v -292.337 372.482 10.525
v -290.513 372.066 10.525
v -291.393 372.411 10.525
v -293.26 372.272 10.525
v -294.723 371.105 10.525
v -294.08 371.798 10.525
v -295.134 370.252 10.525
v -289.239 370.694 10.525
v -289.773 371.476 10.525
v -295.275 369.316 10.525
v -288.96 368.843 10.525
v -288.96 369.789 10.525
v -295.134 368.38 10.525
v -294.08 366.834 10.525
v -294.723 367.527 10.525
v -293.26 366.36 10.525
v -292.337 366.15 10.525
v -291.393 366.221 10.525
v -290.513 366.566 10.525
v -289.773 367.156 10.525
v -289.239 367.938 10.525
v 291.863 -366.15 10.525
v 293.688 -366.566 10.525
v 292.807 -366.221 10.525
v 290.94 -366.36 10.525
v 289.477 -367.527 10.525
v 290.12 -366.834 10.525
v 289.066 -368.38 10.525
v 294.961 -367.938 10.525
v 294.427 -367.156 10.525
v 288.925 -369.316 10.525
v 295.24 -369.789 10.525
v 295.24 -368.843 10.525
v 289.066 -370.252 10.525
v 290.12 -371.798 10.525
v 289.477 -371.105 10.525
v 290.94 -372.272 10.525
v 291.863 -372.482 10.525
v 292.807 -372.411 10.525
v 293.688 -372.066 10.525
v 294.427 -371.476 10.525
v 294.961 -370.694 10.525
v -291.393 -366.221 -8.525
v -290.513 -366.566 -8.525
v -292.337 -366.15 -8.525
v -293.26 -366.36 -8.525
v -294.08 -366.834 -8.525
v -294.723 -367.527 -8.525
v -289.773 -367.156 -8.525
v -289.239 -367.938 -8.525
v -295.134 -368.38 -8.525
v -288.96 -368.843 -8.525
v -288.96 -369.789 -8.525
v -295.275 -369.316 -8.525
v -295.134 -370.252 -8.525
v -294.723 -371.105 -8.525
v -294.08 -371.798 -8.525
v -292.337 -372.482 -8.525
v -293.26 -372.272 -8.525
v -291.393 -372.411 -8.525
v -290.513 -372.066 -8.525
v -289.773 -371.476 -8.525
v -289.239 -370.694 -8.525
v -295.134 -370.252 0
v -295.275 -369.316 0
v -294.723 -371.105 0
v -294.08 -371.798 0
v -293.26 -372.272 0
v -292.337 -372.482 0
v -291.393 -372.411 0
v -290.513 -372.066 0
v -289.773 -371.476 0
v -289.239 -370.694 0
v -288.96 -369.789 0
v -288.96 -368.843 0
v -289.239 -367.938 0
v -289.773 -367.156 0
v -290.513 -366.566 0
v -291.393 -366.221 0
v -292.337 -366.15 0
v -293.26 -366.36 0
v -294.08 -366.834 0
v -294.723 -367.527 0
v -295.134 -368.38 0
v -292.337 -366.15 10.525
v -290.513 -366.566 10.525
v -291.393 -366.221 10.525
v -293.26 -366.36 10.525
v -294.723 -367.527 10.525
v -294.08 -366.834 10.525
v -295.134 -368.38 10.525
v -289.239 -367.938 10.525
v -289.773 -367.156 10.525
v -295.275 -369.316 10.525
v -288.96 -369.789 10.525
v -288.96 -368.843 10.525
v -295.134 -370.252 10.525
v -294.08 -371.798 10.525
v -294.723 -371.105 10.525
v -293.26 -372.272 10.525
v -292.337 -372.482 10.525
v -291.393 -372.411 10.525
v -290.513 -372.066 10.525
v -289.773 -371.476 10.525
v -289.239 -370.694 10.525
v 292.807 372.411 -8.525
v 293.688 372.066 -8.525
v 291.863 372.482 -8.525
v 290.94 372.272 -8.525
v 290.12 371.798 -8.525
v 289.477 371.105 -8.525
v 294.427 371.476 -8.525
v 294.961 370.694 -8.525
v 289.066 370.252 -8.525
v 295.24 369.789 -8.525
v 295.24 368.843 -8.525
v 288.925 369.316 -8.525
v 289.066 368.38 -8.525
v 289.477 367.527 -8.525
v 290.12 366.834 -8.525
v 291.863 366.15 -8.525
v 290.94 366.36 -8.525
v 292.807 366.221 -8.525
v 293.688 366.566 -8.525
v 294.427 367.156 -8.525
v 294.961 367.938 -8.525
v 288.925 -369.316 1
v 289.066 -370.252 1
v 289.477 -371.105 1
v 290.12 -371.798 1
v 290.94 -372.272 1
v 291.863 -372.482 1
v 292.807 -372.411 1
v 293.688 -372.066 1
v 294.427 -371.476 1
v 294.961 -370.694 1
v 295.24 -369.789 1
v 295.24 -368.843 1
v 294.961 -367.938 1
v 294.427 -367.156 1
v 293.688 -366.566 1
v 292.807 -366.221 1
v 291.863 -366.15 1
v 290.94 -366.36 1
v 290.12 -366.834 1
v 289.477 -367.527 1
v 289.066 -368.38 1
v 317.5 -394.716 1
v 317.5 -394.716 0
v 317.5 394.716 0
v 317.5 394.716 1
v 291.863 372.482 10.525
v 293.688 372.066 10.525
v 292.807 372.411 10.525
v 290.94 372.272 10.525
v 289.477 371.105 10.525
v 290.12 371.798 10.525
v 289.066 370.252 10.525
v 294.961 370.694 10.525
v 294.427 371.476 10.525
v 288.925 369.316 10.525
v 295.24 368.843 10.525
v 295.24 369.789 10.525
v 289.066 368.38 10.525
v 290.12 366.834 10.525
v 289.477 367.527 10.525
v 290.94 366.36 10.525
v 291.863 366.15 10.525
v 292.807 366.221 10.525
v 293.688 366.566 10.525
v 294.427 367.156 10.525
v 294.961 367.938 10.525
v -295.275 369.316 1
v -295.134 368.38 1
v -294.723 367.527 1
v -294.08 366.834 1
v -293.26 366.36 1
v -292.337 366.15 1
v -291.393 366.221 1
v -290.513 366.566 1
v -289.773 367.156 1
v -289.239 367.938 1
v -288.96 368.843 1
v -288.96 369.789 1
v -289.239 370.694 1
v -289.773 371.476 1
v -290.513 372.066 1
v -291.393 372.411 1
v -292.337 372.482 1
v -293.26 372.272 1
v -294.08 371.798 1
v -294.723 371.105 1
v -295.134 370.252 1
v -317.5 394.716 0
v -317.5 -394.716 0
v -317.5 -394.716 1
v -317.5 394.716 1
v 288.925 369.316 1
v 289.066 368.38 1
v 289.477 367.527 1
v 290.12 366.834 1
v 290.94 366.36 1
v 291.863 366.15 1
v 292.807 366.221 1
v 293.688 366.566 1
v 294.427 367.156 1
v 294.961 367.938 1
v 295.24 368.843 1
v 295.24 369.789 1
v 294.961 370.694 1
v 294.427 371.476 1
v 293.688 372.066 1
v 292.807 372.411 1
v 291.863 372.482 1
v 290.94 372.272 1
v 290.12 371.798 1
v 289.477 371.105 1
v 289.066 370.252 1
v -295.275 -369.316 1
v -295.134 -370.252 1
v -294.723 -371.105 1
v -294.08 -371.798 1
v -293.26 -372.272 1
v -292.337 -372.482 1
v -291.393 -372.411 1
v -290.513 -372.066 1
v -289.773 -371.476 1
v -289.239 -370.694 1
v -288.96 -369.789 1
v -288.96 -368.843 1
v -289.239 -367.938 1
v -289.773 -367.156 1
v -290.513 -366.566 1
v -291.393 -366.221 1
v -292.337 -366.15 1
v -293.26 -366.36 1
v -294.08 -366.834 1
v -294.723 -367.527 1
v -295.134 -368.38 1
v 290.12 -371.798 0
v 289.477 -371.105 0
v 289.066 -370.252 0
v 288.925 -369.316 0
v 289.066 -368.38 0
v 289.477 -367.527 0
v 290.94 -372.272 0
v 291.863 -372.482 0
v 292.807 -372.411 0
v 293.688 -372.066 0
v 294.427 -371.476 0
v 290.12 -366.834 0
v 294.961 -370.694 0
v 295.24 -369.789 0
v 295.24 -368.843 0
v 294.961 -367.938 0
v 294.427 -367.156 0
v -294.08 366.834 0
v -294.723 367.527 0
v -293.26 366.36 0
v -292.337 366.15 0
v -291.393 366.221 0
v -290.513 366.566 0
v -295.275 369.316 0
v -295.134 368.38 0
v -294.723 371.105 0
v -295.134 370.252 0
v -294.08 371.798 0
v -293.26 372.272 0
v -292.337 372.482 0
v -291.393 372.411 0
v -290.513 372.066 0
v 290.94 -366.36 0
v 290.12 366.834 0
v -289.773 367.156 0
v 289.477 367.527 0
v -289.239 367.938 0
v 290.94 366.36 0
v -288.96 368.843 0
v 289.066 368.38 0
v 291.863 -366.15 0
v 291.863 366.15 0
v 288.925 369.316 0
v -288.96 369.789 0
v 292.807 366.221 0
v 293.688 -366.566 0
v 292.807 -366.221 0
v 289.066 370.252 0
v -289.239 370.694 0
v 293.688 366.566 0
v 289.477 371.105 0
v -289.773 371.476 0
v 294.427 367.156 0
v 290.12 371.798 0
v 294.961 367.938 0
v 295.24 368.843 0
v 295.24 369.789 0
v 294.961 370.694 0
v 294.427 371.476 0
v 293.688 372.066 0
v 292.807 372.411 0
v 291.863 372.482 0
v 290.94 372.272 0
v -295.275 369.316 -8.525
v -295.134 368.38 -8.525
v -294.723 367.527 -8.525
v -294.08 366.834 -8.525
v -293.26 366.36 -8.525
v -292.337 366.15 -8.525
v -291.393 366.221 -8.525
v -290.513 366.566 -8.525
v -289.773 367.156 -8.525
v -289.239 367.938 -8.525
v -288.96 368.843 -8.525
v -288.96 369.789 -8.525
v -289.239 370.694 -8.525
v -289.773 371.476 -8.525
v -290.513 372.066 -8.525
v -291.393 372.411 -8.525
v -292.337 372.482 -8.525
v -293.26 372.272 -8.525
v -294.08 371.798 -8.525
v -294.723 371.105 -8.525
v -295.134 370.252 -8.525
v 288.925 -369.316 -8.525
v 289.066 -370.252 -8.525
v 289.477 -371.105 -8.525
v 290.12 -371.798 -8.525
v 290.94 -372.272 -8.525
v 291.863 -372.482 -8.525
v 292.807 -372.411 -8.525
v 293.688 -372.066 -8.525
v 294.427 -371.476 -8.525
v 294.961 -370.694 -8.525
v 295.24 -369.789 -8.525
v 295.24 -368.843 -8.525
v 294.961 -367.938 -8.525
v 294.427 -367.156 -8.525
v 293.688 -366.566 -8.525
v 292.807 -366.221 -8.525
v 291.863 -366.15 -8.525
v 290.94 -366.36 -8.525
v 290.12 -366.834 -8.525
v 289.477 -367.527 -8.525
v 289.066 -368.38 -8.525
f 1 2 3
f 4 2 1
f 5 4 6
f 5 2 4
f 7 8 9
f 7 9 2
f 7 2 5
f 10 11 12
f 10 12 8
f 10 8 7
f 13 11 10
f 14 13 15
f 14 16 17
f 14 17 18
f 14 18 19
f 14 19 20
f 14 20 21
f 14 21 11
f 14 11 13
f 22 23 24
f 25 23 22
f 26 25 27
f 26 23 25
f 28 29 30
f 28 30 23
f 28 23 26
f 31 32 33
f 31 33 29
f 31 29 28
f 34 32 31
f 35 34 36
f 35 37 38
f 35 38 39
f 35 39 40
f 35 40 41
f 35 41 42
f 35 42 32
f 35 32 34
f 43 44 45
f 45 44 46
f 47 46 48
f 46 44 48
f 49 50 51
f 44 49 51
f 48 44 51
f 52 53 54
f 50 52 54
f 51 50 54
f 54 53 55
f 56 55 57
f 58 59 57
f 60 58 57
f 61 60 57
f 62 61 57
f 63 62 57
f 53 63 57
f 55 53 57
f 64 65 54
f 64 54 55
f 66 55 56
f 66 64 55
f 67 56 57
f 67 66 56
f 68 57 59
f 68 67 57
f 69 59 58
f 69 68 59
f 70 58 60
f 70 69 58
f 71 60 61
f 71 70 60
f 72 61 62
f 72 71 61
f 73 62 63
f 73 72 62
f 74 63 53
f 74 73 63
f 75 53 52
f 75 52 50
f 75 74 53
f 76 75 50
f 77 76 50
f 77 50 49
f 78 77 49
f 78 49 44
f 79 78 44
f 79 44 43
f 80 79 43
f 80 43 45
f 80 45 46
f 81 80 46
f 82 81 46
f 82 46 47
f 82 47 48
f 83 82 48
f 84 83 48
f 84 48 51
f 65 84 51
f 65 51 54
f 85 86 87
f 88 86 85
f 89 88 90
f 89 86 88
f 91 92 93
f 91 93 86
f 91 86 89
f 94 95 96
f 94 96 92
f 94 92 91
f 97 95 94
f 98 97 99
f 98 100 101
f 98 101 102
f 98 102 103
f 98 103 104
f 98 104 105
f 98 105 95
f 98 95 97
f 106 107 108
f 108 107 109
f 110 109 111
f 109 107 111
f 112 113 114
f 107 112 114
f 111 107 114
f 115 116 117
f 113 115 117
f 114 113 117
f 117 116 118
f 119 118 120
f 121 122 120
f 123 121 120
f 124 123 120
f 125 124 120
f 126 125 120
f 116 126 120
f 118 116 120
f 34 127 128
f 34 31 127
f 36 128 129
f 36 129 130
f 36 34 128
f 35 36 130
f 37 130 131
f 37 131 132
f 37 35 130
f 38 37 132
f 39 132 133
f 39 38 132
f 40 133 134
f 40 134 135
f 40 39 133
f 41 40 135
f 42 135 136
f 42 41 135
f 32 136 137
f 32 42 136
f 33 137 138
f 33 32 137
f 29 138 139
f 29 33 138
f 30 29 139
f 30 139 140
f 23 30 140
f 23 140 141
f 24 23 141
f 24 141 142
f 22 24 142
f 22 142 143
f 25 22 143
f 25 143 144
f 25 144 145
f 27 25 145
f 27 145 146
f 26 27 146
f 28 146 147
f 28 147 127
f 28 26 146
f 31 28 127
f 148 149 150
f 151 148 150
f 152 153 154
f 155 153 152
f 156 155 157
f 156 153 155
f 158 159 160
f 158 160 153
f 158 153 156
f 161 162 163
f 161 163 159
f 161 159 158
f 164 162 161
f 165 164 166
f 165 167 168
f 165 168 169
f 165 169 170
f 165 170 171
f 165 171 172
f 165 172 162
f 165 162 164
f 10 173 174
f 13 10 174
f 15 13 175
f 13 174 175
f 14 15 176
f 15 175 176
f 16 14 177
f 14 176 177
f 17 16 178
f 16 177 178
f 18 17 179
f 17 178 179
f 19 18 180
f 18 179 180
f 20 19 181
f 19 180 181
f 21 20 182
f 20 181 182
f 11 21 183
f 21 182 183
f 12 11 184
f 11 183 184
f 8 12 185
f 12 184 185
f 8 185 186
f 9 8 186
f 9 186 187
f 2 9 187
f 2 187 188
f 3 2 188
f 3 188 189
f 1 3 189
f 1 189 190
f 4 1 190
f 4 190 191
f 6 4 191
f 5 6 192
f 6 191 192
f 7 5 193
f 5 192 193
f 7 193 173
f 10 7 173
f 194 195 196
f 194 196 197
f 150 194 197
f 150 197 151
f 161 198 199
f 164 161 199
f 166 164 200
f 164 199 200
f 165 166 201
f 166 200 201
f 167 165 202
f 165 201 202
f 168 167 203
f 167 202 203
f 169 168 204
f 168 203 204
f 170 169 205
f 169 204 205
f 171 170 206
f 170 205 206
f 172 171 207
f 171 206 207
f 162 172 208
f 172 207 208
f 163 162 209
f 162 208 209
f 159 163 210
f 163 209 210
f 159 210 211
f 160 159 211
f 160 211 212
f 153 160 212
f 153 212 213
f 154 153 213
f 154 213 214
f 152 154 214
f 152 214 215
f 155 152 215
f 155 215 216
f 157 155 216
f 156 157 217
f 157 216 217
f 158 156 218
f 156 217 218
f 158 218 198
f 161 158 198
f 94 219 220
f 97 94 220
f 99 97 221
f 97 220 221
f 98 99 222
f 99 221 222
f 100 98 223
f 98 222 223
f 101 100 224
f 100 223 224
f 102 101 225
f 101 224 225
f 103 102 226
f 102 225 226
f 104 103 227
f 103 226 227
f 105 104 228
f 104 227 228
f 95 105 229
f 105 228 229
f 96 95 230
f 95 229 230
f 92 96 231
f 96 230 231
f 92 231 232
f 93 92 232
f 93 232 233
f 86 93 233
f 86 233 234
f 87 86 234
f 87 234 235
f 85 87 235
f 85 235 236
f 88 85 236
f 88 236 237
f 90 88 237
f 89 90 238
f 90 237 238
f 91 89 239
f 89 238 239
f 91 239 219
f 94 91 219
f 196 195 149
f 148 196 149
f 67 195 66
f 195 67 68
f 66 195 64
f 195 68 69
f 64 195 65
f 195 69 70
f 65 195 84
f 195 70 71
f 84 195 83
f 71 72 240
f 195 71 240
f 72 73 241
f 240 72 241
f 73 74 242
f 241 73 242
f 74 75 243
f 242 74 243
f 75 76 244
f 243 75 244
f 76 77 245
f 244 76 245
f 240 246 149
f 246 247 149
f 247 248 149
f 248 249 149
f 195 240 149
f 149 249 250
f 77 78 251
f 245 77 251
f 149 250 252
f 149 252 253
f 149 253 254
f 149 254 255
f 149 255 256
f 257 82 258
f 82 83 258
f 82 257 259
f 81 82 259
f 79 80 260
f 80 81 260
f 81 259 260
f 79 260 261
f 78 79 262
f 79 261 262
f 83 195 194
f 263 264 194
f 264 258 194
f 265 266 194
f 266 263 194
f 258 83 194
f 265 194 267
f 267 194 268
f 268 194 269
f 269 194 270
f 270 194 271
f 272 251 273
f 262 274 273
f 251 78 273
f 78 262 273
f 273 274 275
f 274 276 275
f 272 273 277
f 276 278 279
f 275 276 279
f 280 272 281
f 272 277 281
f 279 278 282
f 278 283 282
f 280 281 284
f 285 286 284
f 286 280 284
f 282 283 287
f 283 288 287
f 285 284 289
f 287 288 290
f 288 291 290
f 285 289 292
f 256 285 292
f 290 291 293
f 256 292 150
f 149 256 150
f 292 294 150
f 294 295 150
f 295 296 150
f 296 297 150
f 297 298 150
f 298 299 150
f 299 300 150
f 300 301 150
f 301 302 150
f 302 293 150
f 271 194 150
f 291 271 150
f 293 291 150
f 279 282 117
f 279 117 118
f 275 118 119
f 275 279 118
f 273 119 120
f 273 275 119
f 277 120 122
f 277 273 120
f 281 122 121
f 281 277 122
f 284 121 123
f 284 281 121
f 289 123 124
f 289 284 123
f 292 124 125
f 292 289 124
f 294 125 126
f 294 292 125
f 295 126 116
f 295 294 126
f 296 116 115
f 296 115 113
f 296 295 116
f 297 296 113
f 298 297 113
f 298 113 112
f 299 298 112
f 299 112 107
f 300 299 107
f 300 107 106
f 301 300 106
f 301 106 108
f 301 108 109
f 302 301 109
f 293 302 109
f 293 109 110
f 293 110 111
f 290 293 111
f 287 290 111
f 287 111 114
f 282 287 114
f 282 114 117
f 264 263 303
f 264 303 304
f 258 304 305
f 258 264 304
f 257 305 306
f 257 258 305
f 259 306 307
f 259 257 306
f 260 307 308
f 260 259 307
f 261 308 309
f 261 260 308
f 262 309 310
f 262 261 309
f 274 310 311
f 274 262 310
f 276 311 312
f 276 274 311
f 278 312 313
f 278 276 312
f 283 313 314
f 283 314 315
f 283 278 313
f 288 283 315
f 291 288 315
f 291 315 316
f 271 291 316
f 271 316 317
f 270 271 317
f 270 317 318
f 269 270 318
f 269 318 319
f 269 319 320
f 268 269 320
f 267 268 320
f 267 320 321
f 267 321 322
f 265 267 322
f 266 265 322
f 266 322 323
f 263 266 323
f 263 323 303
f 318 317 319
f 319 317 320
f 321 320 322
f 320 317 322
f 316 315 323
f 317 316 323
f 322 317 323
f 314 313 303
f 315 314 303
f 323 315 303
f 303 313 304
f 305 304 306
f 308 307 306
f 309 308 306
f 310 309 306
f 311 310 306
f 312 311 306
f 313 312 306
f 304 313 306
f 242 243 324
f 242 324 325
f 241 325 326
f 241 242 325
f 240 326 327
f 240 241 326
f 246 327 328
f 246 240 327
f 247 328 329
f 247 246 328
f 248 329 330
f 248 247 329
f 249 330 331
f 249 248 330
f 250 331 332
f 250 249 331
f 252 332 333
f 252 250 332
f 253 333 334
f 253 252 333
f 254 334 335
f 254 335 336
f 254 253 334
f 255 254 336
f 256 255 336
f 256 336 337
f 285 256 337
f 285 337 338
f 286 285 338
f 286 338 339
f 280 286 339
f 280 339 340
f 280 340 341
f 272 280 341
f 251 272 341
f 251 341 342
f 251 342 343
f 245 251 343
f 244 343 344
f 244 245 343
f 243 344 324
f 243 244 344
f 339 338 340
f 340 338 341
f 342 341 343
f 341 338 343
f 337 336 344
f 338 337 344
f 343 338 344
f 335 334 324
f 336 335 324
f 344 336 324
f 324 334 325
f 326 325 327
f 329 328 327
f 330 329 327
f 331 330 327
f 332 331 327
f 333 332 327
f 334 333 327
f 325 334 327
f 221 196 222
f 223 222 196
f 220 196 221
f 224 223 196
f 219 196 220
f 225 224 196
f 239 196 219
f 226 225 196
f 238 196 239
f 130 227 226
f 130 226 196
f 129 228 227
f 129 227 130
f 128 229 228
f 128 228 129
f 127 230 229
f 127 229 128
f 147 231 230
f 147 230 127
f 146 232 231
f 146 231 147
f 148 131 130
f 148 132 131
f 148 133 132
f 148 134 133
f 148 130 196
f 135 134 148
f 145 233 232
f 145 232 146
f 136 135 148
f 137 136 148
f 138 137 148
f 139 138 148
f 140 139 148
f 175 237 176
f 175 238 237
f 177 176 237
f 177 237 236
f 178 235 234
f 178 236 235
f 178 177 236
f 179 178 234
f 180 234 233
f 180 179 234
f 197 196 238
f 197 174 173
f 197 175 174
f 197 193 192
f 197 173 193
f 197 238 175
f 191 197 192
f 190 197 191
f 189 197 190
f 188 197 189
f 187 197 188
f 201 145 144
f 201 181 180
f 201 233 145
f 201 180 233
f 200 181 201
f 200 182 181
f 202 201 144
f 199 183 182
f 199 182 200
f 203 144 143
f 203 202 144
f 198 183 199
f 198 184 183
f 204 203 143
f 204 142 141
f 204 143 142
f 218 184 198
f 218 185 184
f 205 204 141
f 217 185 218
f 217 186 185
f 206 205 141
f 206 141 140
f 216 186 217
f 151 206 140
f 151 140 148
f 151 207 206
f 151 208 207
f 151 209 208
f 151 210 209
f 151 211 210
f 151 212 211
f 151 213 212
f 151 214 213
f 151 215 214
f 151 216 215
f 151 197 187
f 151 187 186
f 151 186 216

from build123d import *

# Parameters (mm, degrees)
SKETCH1_W           = 635
SKETCH1_H           = 789.432
BOSS_EXTRUDE1_DEPTH = 0.999998
SKETCH2_R           = 3.175
BOSS_EXTRUDE2_DEPTH = 9.525


with BuildPart() as part:
    # Sketch1 → Boss-Extrude1 (new body)
    with BuildSketch(Plane.XY):
        Rectangle(SKETCH1_W, SKETCH1_H)
    extrude(amount=BOSS_EXTRUDE1_DEPTH)

    # Sketch2 → Boss-Extrude2 (add, symmetric)
    with BuildSketch(Plane.XY.offset(0.999998)):
        with Locations(Location((-292.1, 369.316, 0), (0, 0, 180))):
            Circle(SKETCH2_R)
        with Locations(Location((292.1, 369.316, 0), (0, 0, 180))):
            Circle(SKETCH2_R)
        with Locations(Location((-292.1, -369.316, 0), (0, 0, 180))):
            Circle(SKETCH2_R)
        with Locations(Location((292.1, -369.316, 0), (0, 0, 180))):
            Circle(SKETCH2_R)
    extrude(amount=BOSS_EXTRUDE2_DEPTH, both=True)


solid = part.part
